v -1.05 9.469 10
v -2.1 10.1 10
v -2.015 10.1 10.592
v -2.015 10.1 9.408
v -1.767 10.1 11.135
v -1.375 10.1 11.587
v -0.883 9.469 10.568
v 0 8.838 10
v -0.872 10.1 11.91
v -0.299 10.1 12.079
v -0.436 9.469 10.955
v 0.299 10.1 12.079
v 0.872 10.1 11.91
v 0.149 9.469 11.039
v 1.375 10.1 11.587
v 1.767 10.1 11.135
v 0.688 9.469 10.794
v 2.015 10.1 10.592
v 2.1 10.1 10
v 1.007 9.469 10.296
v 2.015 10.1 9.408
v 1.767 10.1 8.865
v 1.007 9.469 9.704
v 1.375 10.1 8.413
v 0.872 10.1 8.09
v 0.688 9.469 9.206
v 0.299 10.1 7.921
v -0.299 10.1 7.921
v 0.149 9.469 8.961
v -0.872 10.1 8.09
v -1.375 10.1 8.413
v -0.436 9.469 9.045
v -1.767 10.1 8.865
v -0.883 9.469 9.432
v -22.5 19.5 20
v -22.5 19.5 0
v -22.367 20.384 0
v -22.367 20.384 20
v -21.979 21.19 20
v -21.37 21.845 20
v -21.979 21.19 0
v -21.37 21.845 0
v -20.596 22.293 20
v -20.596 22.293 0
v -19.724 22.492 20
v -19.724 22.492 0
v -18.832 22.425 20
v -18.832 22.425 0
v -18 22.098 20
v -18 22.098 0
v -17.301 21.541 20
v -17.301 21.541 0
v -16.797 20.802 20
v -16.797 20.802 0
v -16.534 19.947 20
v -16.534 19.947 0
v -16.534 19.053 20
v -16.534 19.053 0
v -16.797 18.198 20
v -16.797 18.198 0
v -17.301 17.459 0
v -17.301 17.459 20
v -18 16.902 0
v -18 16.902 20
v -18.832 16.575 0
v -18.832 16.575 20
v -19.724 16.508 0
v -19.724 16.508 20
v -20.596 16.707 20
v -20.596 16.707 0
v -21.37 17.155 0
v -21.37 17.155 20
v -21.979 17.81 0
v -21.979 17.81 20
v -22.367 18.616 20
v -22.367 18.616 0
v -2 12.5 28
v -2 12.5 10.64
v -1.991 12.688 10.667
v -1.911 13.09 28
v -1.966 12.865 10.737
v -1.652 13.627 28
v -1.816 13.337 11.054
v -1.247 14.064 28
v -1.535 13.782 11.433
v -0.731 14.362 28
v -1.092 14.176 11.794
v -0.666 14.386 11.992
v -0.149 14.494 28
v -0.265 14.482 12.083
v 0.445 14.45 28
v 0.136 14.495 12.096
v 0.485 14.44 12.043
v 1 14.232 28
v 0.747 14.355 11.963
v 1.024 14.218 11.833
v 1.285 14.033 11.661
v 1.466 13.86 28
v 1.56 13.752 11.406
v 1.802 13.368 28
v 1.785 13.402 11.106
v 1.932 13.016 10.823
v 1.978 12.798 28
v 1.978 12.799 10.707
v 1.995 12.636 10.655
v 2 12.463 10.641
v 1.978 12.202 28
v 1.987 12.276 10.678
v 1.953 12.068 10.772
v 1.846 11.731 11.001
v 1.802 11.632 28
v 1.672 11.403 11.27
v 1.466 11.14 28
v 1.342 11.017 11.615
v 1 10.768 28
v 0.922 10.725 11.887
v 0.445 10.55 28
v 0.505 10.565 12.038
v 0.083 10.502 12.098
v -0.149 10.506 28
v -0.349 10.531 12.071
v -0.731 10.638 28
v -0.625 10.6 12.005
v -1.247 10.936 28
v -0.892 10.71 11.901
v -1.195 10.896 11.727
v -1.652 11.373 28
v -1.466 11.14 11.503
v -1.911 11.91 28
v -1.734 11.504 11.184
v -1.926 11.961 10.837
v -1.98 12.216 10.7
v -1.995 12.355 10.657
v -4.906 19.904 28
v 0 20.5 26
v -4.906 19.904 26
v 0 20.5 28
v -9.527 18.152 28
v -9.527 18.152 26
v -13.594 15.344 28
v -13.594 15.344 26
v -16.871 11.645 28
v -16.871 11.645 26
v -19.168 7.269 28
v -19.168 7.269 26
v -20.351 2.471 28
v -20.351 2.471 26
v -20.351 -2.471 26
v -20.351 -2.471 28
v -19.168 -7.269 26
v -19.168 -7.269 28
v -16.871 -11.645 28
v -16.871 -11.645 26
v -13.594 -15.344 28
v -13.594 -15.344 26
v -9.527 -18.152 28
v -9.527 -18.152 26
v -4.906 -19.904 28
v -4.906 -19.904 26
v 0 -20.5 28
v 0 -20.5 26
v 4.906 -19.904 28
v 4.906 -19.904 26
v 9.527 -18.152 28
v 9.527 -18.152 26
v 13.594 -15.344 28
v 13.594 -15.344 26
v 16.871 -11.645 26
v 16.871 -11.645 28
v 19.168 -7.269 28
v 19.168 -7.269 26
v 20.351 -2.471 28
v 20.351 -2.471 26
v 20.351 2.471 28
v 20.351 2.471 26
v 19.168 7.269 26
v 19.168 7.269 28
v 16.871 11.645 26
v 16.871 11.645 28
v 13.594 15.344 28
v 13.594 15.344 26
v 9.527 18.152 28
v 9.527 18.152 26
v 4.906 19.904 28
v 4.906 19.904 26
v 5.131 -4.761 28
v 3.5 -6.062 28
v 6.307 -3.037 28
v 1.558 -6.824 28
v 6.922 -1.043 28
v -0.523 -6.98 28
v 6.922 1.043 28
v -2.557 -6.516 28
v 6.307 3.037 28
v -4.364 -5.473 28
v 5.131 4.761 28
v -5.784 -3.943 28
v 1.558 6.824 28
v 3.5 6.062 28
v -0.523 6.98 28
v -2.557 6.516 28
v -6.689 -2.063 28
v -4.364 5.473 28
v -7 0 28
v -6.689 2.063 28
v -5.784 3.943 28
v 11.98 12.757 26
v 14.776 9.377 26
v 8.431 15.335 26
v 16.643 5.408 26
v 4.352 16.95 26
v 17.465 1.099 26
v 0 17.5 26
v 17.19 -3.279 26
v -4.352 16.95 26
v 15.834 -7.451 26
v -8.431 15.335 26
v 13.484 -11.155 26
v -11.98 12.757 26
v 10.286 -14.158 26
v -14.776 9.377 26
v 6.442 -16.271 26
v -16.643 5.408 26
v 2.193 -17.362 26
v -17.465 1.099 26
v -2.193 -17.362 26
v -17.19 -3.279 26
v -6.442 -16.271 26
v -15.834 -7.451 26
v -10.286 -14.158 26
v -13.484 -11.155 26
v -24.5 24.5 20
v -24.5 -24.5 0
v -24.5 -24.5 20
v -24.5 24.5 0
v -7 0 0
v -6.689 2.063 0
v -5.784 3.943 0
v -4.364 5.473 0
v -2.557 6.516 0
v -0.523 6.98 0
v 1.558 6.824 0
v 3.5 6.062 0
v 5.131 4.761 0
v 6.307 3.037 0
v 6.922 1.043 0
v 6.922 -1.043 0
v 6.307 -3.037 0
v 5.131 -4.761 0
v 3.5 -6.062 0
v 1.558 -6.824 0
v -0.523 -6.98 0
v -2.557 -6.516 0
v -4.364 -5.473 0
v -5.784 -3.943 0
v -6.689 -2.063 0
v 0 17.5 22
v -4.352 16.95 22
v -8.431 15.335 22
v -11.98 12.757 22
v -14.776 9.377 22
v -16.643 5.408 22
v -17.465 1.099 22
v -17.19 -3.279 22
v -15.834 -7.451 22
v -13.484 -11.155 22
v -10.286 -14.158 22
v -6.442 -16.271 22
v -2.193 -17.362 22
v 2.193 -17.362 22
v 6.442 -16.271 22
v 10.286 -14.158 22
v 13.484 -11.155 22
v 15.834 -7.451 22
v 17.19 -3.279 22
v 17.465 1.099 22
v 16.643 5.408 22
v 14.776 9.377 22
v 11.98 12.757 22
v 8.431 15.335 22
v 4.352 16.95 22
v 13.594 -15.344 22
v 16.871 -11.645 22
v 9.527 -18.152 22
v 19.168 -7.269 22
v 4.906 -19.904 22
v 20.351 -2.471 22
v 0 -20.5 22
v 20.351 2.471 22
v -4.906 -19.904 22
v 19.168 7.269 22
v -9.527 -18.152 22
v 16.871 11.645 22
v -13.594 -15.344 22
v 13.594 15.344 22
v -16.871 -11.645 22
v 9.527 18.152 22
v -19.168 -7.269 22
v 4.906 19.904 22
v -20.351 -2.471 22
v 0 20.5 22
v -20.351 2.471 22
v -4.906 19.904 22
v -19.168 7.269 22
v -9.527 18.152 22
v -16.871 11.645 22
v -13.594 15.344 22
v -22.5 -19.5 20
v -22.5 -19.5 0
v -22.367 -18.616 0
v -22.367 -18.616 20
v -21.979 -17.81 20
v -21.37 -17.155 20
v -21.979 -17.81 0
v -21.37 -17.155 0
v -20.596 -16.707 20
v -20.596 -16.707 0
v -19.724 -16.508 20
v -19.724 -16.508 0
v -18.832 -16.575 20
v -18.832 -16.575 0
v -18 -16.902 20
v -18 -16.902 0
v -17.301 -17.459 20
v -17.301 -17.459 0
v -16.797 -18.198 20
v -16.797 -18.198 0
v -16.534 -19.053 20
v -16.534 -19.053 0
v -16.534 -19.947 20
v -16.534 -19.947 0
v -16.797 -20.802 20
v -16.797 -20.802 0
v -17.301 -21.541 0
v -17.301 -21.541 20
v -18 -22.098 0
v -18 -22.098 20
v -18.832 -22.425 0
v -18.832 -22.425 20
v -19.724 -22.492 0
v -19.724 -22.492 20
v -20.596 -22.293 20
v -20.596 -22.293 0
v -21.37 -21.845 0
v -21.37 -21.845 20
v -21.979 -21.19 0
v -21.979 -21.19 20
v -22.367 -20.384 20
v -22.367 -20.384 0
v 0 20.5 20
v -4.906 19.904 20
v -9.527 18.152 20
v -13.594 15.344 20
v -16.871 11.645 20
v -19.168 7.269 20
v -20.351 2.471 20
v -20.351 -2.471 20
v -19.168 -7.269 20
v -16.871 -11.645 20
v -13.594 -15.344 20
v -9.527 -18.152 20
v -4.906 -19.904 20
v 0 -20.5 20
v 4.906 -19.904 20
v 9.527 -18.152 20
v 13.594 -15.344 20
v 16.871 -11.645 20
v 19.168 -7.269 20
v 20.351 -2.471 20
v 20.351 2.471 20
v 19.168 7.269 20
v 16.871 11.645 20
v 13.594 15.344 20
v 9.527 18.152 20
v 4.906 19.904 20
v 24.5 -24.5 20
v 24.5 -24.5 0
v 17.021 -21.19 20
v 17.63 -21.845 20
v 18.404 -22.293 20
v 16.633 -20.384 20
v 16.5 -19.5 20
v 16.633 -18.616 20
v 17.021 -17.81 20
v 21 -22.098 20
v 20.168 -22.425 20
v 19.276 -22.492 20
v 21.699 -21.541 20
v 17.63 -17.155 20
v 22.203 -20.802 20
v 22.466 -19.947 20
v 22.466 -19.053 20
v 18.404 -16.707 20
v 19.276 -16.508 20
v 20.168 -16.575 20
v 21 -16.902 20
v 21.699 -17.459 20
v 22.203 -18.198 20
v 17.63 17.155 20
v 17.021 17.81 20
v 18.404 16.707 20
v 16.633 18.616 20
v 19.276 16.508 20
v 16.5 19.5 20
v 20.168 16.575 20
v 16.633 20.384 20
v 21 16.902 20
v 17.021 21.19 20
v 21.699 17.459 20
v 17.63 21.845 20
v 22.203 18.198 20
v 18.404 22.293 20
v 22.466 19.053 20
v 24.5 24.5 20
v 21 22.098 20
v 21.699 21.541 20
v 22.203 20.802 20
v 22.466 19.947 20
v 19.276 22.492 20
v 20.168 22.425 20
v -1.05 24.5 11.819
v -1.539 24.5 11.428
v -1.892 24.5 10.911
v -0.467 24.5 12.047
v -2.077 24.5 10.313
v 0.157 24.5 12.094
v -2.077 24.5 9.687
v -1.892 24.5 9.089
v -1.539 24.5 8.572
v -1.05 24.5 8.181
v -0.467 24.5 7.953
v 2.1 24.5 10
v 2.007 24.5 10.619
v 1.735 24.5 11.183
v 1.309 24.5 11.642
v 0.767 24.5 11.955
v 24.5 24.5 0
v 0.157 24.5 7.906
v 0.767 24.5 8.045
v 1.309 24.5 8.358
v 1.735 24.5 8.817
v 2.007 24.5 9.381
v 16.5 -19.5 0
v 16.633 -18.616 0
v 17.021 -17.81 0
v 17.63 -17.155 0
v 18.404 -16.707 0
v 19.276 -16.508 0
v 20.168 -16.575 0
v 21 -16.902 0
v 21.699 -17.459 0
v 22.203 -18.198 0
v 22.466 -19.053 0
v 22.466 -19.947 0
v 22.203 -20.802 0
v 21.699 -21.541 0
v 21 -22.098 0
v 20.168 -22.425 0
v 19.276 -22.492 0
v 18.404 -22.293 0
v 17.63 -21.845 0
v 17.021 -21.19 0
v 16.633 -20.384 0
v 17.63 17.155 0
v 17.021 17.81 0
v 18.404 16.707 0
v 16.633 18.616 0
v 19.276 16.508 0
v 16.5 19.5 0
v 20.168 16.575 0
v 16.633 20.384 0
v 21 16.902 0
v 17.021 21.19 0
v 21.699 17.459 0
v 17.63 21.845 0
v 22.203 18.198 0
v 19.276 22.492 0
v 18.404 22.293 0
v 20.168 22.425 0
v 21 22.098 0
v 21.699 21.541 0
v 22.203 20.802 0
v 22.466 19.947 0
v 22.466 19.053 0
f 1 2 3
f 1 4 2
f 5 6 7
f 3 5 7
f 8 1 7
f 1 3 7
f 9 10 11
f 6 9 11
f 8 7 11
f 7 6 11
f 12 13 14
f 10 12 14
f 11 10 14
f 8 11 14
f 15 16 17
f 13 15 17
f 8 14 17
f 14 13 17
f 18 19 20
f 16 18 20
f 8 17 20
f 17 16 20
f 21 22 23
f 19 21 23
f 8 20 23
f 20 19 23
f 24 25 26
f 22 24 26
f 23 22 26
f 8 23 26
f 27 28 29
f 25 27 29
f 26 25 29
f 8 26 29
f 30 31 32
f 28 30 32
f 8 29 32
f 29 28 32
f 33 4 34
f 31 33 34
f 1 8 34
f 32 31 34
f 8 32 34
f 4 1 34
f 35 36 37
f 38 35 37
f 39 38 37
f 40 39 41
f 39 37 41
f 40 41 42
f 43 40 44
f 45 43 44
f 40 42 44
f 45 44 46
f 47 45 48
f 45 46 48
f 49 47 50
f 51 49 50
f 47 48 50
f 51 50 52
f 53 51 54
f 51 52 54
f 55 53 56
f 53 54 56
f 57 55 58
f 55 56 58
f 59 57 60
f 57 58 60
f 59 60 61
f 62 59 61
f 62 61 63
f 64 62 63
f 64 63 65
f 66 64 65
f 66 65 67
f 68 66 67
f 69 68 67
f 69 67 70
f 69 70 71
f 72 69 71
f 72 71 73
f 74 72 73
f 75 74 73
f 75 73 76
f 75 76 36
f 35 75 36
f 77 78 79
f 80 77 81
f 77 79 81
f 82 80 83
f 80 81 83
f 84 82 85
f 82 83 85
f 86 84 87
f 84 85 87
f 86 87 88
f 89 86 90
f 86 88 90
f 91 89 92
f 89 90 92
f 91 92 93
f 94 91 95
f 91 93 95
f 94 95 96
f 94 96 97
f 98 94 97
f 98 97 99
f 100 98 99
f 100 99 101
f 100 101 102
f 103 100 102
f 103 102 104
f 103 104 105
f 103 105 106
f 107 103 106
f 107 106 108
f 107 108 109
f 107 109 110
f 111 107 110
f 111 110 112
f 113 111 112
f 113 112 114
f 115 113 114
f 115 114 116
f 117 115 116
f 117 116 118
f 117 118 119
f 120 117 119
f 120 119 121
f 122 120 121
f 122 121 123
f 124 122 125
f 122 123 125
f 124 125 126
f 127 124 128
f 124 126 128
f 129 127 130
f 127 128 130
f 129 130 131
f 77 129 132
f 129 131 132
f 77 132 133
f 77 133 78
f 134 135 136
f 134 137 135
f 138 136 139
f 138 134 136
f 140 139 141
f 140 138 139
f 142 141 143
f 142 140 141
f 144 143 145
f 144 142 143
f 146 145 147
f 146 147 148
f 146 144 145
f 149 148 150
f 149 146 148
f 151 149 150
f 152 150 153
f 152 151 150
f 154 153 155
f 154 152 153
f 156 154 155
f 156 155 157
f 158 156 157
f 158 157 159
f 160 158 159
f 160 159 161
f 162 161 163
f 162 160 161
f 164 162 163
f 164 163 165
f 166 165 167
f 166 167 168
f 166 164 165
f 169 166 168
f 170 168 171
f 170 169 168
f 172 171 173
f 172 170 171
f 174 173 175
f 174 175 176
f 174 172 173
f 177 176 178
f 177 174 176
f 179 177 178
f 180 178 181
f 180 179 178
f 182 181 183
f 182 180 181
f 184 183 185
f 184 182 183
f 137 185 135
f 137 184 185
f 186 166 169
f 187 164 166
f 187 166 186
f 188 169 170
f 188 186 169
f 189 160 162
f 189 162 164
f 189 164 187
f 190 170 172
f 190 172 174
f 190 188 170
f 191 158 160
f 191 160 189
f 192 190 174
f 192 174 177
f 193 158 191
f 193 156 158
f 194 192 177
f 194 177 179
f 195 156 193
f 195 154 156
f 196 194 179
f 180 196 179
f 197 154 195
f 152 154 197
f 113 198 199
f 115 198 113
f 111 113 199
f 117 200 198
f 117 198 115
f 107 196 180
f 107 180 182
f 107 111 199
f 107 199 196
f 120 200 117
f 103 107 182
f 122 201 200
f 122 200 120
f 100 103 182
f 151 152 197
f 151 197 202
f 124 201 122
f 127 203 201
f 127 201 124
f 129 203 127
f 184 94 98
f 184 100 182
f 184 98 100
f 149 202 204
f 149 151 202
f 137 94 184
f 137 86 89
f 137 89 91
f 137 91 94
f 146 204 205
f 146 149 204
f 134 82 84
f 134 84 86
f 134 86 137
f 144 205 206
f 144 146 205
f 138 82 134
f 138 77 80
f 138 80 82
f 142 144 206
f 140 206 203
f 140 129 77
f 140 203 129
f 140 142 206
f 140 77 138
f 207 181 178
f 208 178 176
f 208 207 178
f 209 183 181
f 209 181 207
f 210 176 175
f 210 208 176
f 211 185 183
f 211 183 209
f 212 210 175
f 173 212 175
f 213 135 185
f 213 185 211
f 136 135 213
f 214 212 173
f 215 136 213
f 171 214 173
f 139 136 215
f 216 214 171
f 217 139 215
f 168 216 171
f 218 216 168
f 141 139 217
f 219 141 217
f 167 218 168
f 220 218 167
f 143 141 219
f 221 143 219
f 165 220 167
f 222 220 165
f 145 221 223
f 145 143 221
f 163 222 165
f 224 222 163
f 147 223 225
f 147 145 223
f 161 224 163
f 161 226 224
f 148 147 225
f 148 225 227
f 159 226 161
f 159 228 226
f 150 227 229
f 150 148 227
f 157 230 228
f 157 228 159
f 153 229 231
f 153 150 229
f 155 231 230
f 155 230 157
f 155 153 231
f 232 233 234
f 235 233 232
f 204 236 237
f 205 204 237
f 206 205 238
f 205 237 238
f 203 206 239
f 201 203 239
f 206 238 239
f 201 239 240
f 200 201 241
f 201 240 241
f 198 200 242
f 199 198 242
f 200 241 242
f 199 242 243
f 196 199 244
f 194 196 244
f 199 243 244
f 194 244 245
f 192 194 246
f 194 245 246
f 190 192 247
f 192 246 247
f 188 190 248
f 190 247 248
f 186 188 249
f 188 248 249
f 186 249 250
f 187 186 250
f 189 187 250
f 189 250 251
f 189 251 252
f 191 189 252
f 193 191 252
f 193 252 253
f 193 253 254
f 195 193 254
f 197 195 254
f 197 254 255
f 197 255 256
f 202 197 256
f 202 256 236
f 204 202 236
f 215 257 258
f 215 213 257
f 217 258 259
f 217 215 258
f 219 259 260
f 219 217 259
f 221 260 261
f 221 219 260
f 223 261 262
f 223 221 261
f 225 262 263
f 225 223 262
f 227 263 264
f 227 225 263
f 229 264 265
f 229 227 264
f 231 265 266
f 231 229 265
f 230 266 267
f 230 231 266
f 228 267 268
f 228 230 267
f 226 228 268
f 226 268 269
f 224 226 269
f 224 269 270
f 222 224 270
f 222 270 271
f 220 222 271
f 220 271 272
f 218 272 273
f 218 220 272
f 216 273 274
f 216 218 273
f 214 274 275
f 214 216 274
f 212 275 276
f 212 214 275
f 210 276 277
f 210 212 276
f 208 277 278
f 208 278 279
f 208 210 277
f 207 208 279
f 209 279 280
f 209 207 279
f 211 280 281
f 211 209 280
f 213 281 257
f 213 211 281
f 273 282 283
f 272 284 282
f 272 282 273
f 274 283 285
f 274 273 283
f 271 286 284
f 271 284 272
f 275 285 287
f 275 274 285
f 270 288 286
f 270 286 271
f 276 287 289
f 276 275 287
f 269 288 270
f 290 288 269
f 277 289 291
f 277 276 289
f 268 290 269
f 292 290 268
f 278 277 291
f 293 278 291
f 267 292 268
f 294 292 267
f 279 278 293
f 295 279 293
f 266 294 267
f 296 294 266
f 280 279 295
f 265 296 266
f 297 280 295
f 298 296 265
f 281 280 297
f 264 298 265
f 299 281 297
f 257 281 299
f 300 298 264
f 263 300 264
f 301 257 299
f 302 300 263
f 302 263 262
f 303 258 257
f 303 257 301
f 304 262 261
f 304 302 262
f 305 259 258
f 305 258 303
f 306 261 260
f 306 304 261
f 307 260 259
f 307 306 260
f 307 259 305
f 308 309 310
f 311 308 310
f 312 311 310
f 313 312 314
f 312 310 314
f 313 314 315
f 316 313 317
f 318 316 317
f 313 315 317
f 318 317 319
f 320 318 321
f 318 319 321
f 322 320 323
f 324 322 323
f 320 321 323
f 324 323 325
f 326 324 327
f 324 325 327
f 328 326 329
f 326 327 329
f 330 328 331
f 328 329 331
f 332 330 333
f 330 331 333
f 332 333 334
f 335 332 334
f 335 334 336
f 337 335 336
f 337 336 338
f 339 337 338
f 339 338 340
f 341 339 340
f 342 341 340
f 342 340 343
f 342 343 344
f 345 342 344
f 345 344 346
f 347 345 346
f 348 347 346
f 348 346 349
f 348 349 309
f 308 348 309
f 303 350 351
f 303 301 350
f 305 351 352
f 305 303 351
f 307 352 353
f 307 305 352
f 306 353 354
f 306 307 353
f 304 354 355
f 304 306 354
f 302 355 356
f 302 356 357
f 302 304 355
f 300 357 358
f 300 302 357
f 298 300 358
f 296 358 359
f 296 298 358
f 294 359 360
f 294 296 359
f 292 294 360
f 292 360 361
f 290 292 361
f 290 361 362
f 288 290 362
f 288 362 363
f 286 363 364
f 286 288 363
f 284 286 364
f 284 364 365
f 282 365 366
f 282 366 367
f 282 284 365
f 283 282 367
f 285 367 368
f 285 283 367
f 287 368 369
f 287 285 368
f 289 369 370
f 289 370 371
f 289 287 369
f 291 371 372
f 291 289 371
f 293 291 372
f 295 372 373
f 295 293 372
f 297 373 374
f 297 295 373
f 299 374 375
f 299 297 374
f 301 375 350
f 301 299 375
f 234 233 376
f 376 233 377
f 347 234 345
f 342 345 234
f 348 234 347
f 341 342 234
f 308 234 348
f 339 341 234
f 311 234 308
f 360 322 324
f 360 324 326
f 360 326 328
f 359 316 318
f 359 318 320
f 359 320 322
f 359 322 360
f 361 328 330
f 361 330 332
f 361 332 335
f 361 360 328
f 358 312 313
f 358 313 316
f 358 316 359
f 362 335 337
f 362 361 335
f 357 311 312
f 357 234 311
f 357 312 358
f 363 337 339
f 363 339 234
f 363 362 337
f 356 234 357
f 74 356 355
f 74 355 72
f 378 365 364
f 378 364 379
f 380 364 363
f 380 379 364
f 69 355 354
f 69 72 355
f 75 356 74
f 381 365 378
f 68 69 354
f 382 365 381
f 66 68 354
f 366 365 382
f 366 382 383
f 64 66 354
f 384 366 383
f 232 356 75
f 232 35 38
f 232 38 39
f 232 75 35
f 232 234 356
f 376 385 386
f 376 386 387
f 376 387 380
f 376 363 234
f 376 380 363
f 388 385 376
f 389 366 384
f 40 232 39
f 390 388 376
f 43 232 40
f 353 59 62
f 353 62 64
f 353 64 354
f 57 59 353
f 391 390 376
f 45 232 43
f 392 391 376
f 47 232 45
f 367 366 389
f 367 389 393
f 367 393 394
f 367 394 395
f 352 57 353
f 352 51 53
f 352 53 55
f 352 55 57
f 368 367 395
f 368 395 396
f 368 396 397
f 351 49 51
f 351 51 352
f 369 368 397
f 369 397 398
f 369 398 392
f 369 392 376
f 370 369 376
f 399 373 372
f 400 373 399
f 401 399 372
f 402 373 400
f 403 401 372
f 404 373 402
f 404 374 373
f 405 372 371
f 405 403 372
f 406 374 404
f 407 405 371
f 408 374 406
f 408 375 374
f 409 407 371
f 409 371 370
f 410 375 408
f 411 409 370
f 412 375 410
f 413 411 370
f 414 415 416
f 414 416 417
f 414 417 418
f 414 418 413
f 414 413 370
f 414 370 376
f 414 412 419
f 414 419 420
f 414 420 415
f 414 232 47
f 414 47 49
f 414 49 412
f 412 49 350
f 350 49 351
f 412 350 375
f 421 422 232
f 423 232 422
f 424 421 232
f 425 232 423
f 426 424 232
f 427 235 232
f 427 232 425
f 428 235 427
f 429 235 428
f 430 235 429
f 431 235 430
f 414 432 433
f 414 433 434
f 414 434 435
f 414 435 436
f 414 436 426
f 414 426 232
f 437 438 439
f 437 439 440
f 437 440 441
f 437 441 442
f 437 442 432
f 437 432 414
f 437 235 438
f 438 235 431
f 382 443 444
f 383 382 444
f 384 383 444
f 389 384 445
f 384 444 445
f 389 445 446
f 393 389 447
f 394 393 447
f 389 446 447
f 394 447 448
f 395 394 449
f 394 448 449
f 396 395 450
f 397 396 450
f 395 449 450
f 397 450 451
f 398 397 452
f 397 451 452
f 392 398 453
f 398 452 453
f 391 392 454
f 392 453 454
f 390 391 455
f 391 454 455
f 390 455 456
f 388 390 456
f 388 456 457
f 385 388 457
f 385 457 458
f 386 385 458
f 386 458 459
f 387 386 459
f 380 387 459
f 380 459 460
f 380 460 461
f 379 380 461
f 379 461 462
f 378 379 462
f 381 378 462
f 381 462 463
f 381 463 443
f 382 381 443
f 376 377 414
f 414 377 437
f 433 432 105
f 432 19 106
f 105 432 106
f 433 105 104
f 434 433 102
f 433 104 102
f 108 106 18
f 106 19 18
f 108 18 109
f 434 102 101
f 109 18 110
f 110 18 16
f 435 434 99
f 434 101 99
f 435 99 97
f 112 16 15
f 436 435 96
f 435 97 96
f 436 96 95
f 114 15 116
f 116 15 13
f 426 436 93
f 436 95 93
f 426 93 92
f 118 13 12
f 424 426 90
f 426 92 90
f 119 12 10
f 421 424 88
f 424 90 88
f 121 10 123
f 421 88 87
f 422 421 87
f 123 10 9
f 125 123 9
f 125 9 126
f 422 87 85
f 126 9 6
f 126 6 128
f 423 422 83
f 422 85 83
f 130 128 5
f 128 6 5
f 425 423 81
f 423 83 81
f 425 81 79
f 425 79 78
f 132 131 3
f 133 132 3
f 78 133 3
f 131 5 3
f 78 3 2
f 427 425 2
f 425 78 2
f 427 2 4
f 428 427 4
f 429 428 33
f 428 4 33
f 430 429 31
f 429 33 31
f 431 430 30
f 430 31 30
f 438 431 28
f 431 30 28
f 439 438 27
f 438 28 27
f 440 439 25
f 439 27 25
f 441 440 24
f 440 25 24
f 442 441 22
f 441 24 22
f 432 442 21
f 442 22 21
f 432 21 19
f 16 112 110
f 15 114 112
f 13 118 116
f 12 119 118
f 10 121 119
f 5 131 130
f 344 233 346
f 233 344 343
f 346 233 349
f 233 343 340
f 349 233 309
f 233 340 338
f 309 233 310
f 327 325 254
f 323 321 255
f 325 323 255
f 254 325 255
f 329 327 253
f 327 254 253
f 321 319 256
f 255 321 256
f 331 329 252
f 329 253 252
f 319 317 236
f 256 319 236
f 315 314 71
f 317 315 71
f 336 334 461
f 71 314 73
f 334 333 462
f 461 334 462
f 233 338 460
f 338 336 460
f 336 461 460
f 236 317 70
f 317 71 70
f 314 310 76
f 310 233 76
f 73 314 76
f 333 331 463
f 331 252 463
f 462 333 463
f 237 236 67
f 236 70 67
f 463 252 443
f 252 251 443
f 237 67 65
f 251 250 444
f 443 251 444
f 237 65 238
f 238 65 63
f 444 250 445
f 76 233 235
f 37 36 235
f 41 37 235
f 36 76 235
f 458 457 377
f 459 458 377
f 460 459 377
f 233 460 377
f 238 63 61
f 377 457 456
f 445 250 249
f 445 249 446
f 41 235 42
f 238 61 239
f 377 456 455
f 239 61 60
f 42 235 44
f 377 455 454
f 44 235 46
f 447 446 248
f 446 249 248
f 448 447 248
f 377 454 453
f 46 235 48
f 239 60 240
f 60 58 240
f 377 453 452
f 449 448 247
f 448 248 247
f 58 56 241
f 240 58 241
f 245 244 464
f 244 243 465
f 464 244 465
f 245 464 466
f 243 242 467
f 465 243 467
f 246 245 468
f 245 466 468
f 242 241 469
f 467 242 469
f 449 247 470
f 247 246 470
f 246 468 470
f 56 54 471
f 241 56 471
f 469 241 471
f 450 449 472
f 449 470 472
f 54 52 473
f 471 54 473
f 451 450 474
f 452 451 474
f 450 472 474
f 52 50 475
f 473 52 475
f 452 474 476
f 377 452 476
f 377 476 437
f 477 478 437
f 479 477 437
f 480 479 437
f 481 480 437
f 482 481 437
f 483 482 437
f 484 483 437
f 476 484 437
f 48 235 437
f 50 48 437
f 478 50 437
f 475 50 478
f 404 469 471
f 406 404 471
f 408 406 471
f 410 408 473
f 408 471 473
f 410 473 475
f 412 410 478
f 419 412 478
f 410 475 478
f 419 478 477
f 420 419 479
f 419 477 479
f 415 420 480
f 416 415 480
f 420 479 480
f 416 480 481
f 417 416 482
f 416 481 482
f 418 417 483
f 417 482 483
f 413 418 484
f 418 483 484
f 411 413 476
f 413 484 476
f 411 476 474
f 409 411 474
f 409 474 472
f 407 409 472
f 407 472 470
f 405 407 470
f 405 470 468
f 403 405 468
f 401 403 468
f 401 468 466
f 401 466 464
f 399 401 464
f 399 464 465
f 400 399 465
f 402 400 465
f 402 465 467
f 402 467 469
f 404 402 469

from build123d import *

# Parameters (mm, degrees)
F0_W     = 49
F0_H     = 49
F1_DEPTH = 20
F3_D     = 6
F7_D     = 4.2
F7_DEPTH = 14.4
F7_TIP   = 1.2618073
F9_D     = 4
F9_DEPTH = 18
F9_TIP   = 1.2017212381
F11_D    = 14


with BuildPart() as f1:
    # F0 (on Top) → F1 (new body)
    with BuildSketch(Plane.XY):
        Rectangle(F0_W, F0_H)
    extrude(amount=F1_DEPTH)

    # F3 (through all)
    with Locations(Plane.XY.offset(20)):
        with Locations((-19.5, -19.5), (-19.5, 19.5), (19.5, 19.5), (19.5, -19.5)):
            Hole(F3_D / 2)

    # F4 (on Right) → F5 (revolve)
    with BuildSketch(Plane.YZ):
        Polygon((0, 28), (0, 20), (20.5, 20), (20.5, 22), (17.5, 22), (17.5, 26), (20.5, 26), (20.5, 28), align=None)
    revolve(axis=Axis((0, 0, 24), (0, 0, 1)))

    # F7
    with Locations(Plane(origin=(0, 24.5, 0), x_dir=(-1, 0, 0), z_dir=(0, 1, 0))):
        with Locations((0, 10)):
            Hole(F7_D / 2, depth=F7_DEPTH)
            with Locations((0, 0, -(F7_DEPTH + F7_TIP / 2))):  # 118° drill point
                Cone(0, F7_D / 2, F7_TIP, mode=Mode.SUBTRACT)

    # F9
    with Locations(Plane.XY.offset(28)):
        with Locations((0, 12.5)):
            Hole(F9_D / 2, depth=F9_DEPTH)
            with Locations((0, 0, -(F9_DEPTH + F9_TIP / 2))):  # 118° drill point
                Cone(0, F9_D / 2, F9_TIP, mode=Mode.SUBTRACT)

    # F11 (through all)
    with Locations(Plane.XY.offset(28)):
        with Locations((0, 0)):
            Hole(F11_D / 2)


solid = f1.part
